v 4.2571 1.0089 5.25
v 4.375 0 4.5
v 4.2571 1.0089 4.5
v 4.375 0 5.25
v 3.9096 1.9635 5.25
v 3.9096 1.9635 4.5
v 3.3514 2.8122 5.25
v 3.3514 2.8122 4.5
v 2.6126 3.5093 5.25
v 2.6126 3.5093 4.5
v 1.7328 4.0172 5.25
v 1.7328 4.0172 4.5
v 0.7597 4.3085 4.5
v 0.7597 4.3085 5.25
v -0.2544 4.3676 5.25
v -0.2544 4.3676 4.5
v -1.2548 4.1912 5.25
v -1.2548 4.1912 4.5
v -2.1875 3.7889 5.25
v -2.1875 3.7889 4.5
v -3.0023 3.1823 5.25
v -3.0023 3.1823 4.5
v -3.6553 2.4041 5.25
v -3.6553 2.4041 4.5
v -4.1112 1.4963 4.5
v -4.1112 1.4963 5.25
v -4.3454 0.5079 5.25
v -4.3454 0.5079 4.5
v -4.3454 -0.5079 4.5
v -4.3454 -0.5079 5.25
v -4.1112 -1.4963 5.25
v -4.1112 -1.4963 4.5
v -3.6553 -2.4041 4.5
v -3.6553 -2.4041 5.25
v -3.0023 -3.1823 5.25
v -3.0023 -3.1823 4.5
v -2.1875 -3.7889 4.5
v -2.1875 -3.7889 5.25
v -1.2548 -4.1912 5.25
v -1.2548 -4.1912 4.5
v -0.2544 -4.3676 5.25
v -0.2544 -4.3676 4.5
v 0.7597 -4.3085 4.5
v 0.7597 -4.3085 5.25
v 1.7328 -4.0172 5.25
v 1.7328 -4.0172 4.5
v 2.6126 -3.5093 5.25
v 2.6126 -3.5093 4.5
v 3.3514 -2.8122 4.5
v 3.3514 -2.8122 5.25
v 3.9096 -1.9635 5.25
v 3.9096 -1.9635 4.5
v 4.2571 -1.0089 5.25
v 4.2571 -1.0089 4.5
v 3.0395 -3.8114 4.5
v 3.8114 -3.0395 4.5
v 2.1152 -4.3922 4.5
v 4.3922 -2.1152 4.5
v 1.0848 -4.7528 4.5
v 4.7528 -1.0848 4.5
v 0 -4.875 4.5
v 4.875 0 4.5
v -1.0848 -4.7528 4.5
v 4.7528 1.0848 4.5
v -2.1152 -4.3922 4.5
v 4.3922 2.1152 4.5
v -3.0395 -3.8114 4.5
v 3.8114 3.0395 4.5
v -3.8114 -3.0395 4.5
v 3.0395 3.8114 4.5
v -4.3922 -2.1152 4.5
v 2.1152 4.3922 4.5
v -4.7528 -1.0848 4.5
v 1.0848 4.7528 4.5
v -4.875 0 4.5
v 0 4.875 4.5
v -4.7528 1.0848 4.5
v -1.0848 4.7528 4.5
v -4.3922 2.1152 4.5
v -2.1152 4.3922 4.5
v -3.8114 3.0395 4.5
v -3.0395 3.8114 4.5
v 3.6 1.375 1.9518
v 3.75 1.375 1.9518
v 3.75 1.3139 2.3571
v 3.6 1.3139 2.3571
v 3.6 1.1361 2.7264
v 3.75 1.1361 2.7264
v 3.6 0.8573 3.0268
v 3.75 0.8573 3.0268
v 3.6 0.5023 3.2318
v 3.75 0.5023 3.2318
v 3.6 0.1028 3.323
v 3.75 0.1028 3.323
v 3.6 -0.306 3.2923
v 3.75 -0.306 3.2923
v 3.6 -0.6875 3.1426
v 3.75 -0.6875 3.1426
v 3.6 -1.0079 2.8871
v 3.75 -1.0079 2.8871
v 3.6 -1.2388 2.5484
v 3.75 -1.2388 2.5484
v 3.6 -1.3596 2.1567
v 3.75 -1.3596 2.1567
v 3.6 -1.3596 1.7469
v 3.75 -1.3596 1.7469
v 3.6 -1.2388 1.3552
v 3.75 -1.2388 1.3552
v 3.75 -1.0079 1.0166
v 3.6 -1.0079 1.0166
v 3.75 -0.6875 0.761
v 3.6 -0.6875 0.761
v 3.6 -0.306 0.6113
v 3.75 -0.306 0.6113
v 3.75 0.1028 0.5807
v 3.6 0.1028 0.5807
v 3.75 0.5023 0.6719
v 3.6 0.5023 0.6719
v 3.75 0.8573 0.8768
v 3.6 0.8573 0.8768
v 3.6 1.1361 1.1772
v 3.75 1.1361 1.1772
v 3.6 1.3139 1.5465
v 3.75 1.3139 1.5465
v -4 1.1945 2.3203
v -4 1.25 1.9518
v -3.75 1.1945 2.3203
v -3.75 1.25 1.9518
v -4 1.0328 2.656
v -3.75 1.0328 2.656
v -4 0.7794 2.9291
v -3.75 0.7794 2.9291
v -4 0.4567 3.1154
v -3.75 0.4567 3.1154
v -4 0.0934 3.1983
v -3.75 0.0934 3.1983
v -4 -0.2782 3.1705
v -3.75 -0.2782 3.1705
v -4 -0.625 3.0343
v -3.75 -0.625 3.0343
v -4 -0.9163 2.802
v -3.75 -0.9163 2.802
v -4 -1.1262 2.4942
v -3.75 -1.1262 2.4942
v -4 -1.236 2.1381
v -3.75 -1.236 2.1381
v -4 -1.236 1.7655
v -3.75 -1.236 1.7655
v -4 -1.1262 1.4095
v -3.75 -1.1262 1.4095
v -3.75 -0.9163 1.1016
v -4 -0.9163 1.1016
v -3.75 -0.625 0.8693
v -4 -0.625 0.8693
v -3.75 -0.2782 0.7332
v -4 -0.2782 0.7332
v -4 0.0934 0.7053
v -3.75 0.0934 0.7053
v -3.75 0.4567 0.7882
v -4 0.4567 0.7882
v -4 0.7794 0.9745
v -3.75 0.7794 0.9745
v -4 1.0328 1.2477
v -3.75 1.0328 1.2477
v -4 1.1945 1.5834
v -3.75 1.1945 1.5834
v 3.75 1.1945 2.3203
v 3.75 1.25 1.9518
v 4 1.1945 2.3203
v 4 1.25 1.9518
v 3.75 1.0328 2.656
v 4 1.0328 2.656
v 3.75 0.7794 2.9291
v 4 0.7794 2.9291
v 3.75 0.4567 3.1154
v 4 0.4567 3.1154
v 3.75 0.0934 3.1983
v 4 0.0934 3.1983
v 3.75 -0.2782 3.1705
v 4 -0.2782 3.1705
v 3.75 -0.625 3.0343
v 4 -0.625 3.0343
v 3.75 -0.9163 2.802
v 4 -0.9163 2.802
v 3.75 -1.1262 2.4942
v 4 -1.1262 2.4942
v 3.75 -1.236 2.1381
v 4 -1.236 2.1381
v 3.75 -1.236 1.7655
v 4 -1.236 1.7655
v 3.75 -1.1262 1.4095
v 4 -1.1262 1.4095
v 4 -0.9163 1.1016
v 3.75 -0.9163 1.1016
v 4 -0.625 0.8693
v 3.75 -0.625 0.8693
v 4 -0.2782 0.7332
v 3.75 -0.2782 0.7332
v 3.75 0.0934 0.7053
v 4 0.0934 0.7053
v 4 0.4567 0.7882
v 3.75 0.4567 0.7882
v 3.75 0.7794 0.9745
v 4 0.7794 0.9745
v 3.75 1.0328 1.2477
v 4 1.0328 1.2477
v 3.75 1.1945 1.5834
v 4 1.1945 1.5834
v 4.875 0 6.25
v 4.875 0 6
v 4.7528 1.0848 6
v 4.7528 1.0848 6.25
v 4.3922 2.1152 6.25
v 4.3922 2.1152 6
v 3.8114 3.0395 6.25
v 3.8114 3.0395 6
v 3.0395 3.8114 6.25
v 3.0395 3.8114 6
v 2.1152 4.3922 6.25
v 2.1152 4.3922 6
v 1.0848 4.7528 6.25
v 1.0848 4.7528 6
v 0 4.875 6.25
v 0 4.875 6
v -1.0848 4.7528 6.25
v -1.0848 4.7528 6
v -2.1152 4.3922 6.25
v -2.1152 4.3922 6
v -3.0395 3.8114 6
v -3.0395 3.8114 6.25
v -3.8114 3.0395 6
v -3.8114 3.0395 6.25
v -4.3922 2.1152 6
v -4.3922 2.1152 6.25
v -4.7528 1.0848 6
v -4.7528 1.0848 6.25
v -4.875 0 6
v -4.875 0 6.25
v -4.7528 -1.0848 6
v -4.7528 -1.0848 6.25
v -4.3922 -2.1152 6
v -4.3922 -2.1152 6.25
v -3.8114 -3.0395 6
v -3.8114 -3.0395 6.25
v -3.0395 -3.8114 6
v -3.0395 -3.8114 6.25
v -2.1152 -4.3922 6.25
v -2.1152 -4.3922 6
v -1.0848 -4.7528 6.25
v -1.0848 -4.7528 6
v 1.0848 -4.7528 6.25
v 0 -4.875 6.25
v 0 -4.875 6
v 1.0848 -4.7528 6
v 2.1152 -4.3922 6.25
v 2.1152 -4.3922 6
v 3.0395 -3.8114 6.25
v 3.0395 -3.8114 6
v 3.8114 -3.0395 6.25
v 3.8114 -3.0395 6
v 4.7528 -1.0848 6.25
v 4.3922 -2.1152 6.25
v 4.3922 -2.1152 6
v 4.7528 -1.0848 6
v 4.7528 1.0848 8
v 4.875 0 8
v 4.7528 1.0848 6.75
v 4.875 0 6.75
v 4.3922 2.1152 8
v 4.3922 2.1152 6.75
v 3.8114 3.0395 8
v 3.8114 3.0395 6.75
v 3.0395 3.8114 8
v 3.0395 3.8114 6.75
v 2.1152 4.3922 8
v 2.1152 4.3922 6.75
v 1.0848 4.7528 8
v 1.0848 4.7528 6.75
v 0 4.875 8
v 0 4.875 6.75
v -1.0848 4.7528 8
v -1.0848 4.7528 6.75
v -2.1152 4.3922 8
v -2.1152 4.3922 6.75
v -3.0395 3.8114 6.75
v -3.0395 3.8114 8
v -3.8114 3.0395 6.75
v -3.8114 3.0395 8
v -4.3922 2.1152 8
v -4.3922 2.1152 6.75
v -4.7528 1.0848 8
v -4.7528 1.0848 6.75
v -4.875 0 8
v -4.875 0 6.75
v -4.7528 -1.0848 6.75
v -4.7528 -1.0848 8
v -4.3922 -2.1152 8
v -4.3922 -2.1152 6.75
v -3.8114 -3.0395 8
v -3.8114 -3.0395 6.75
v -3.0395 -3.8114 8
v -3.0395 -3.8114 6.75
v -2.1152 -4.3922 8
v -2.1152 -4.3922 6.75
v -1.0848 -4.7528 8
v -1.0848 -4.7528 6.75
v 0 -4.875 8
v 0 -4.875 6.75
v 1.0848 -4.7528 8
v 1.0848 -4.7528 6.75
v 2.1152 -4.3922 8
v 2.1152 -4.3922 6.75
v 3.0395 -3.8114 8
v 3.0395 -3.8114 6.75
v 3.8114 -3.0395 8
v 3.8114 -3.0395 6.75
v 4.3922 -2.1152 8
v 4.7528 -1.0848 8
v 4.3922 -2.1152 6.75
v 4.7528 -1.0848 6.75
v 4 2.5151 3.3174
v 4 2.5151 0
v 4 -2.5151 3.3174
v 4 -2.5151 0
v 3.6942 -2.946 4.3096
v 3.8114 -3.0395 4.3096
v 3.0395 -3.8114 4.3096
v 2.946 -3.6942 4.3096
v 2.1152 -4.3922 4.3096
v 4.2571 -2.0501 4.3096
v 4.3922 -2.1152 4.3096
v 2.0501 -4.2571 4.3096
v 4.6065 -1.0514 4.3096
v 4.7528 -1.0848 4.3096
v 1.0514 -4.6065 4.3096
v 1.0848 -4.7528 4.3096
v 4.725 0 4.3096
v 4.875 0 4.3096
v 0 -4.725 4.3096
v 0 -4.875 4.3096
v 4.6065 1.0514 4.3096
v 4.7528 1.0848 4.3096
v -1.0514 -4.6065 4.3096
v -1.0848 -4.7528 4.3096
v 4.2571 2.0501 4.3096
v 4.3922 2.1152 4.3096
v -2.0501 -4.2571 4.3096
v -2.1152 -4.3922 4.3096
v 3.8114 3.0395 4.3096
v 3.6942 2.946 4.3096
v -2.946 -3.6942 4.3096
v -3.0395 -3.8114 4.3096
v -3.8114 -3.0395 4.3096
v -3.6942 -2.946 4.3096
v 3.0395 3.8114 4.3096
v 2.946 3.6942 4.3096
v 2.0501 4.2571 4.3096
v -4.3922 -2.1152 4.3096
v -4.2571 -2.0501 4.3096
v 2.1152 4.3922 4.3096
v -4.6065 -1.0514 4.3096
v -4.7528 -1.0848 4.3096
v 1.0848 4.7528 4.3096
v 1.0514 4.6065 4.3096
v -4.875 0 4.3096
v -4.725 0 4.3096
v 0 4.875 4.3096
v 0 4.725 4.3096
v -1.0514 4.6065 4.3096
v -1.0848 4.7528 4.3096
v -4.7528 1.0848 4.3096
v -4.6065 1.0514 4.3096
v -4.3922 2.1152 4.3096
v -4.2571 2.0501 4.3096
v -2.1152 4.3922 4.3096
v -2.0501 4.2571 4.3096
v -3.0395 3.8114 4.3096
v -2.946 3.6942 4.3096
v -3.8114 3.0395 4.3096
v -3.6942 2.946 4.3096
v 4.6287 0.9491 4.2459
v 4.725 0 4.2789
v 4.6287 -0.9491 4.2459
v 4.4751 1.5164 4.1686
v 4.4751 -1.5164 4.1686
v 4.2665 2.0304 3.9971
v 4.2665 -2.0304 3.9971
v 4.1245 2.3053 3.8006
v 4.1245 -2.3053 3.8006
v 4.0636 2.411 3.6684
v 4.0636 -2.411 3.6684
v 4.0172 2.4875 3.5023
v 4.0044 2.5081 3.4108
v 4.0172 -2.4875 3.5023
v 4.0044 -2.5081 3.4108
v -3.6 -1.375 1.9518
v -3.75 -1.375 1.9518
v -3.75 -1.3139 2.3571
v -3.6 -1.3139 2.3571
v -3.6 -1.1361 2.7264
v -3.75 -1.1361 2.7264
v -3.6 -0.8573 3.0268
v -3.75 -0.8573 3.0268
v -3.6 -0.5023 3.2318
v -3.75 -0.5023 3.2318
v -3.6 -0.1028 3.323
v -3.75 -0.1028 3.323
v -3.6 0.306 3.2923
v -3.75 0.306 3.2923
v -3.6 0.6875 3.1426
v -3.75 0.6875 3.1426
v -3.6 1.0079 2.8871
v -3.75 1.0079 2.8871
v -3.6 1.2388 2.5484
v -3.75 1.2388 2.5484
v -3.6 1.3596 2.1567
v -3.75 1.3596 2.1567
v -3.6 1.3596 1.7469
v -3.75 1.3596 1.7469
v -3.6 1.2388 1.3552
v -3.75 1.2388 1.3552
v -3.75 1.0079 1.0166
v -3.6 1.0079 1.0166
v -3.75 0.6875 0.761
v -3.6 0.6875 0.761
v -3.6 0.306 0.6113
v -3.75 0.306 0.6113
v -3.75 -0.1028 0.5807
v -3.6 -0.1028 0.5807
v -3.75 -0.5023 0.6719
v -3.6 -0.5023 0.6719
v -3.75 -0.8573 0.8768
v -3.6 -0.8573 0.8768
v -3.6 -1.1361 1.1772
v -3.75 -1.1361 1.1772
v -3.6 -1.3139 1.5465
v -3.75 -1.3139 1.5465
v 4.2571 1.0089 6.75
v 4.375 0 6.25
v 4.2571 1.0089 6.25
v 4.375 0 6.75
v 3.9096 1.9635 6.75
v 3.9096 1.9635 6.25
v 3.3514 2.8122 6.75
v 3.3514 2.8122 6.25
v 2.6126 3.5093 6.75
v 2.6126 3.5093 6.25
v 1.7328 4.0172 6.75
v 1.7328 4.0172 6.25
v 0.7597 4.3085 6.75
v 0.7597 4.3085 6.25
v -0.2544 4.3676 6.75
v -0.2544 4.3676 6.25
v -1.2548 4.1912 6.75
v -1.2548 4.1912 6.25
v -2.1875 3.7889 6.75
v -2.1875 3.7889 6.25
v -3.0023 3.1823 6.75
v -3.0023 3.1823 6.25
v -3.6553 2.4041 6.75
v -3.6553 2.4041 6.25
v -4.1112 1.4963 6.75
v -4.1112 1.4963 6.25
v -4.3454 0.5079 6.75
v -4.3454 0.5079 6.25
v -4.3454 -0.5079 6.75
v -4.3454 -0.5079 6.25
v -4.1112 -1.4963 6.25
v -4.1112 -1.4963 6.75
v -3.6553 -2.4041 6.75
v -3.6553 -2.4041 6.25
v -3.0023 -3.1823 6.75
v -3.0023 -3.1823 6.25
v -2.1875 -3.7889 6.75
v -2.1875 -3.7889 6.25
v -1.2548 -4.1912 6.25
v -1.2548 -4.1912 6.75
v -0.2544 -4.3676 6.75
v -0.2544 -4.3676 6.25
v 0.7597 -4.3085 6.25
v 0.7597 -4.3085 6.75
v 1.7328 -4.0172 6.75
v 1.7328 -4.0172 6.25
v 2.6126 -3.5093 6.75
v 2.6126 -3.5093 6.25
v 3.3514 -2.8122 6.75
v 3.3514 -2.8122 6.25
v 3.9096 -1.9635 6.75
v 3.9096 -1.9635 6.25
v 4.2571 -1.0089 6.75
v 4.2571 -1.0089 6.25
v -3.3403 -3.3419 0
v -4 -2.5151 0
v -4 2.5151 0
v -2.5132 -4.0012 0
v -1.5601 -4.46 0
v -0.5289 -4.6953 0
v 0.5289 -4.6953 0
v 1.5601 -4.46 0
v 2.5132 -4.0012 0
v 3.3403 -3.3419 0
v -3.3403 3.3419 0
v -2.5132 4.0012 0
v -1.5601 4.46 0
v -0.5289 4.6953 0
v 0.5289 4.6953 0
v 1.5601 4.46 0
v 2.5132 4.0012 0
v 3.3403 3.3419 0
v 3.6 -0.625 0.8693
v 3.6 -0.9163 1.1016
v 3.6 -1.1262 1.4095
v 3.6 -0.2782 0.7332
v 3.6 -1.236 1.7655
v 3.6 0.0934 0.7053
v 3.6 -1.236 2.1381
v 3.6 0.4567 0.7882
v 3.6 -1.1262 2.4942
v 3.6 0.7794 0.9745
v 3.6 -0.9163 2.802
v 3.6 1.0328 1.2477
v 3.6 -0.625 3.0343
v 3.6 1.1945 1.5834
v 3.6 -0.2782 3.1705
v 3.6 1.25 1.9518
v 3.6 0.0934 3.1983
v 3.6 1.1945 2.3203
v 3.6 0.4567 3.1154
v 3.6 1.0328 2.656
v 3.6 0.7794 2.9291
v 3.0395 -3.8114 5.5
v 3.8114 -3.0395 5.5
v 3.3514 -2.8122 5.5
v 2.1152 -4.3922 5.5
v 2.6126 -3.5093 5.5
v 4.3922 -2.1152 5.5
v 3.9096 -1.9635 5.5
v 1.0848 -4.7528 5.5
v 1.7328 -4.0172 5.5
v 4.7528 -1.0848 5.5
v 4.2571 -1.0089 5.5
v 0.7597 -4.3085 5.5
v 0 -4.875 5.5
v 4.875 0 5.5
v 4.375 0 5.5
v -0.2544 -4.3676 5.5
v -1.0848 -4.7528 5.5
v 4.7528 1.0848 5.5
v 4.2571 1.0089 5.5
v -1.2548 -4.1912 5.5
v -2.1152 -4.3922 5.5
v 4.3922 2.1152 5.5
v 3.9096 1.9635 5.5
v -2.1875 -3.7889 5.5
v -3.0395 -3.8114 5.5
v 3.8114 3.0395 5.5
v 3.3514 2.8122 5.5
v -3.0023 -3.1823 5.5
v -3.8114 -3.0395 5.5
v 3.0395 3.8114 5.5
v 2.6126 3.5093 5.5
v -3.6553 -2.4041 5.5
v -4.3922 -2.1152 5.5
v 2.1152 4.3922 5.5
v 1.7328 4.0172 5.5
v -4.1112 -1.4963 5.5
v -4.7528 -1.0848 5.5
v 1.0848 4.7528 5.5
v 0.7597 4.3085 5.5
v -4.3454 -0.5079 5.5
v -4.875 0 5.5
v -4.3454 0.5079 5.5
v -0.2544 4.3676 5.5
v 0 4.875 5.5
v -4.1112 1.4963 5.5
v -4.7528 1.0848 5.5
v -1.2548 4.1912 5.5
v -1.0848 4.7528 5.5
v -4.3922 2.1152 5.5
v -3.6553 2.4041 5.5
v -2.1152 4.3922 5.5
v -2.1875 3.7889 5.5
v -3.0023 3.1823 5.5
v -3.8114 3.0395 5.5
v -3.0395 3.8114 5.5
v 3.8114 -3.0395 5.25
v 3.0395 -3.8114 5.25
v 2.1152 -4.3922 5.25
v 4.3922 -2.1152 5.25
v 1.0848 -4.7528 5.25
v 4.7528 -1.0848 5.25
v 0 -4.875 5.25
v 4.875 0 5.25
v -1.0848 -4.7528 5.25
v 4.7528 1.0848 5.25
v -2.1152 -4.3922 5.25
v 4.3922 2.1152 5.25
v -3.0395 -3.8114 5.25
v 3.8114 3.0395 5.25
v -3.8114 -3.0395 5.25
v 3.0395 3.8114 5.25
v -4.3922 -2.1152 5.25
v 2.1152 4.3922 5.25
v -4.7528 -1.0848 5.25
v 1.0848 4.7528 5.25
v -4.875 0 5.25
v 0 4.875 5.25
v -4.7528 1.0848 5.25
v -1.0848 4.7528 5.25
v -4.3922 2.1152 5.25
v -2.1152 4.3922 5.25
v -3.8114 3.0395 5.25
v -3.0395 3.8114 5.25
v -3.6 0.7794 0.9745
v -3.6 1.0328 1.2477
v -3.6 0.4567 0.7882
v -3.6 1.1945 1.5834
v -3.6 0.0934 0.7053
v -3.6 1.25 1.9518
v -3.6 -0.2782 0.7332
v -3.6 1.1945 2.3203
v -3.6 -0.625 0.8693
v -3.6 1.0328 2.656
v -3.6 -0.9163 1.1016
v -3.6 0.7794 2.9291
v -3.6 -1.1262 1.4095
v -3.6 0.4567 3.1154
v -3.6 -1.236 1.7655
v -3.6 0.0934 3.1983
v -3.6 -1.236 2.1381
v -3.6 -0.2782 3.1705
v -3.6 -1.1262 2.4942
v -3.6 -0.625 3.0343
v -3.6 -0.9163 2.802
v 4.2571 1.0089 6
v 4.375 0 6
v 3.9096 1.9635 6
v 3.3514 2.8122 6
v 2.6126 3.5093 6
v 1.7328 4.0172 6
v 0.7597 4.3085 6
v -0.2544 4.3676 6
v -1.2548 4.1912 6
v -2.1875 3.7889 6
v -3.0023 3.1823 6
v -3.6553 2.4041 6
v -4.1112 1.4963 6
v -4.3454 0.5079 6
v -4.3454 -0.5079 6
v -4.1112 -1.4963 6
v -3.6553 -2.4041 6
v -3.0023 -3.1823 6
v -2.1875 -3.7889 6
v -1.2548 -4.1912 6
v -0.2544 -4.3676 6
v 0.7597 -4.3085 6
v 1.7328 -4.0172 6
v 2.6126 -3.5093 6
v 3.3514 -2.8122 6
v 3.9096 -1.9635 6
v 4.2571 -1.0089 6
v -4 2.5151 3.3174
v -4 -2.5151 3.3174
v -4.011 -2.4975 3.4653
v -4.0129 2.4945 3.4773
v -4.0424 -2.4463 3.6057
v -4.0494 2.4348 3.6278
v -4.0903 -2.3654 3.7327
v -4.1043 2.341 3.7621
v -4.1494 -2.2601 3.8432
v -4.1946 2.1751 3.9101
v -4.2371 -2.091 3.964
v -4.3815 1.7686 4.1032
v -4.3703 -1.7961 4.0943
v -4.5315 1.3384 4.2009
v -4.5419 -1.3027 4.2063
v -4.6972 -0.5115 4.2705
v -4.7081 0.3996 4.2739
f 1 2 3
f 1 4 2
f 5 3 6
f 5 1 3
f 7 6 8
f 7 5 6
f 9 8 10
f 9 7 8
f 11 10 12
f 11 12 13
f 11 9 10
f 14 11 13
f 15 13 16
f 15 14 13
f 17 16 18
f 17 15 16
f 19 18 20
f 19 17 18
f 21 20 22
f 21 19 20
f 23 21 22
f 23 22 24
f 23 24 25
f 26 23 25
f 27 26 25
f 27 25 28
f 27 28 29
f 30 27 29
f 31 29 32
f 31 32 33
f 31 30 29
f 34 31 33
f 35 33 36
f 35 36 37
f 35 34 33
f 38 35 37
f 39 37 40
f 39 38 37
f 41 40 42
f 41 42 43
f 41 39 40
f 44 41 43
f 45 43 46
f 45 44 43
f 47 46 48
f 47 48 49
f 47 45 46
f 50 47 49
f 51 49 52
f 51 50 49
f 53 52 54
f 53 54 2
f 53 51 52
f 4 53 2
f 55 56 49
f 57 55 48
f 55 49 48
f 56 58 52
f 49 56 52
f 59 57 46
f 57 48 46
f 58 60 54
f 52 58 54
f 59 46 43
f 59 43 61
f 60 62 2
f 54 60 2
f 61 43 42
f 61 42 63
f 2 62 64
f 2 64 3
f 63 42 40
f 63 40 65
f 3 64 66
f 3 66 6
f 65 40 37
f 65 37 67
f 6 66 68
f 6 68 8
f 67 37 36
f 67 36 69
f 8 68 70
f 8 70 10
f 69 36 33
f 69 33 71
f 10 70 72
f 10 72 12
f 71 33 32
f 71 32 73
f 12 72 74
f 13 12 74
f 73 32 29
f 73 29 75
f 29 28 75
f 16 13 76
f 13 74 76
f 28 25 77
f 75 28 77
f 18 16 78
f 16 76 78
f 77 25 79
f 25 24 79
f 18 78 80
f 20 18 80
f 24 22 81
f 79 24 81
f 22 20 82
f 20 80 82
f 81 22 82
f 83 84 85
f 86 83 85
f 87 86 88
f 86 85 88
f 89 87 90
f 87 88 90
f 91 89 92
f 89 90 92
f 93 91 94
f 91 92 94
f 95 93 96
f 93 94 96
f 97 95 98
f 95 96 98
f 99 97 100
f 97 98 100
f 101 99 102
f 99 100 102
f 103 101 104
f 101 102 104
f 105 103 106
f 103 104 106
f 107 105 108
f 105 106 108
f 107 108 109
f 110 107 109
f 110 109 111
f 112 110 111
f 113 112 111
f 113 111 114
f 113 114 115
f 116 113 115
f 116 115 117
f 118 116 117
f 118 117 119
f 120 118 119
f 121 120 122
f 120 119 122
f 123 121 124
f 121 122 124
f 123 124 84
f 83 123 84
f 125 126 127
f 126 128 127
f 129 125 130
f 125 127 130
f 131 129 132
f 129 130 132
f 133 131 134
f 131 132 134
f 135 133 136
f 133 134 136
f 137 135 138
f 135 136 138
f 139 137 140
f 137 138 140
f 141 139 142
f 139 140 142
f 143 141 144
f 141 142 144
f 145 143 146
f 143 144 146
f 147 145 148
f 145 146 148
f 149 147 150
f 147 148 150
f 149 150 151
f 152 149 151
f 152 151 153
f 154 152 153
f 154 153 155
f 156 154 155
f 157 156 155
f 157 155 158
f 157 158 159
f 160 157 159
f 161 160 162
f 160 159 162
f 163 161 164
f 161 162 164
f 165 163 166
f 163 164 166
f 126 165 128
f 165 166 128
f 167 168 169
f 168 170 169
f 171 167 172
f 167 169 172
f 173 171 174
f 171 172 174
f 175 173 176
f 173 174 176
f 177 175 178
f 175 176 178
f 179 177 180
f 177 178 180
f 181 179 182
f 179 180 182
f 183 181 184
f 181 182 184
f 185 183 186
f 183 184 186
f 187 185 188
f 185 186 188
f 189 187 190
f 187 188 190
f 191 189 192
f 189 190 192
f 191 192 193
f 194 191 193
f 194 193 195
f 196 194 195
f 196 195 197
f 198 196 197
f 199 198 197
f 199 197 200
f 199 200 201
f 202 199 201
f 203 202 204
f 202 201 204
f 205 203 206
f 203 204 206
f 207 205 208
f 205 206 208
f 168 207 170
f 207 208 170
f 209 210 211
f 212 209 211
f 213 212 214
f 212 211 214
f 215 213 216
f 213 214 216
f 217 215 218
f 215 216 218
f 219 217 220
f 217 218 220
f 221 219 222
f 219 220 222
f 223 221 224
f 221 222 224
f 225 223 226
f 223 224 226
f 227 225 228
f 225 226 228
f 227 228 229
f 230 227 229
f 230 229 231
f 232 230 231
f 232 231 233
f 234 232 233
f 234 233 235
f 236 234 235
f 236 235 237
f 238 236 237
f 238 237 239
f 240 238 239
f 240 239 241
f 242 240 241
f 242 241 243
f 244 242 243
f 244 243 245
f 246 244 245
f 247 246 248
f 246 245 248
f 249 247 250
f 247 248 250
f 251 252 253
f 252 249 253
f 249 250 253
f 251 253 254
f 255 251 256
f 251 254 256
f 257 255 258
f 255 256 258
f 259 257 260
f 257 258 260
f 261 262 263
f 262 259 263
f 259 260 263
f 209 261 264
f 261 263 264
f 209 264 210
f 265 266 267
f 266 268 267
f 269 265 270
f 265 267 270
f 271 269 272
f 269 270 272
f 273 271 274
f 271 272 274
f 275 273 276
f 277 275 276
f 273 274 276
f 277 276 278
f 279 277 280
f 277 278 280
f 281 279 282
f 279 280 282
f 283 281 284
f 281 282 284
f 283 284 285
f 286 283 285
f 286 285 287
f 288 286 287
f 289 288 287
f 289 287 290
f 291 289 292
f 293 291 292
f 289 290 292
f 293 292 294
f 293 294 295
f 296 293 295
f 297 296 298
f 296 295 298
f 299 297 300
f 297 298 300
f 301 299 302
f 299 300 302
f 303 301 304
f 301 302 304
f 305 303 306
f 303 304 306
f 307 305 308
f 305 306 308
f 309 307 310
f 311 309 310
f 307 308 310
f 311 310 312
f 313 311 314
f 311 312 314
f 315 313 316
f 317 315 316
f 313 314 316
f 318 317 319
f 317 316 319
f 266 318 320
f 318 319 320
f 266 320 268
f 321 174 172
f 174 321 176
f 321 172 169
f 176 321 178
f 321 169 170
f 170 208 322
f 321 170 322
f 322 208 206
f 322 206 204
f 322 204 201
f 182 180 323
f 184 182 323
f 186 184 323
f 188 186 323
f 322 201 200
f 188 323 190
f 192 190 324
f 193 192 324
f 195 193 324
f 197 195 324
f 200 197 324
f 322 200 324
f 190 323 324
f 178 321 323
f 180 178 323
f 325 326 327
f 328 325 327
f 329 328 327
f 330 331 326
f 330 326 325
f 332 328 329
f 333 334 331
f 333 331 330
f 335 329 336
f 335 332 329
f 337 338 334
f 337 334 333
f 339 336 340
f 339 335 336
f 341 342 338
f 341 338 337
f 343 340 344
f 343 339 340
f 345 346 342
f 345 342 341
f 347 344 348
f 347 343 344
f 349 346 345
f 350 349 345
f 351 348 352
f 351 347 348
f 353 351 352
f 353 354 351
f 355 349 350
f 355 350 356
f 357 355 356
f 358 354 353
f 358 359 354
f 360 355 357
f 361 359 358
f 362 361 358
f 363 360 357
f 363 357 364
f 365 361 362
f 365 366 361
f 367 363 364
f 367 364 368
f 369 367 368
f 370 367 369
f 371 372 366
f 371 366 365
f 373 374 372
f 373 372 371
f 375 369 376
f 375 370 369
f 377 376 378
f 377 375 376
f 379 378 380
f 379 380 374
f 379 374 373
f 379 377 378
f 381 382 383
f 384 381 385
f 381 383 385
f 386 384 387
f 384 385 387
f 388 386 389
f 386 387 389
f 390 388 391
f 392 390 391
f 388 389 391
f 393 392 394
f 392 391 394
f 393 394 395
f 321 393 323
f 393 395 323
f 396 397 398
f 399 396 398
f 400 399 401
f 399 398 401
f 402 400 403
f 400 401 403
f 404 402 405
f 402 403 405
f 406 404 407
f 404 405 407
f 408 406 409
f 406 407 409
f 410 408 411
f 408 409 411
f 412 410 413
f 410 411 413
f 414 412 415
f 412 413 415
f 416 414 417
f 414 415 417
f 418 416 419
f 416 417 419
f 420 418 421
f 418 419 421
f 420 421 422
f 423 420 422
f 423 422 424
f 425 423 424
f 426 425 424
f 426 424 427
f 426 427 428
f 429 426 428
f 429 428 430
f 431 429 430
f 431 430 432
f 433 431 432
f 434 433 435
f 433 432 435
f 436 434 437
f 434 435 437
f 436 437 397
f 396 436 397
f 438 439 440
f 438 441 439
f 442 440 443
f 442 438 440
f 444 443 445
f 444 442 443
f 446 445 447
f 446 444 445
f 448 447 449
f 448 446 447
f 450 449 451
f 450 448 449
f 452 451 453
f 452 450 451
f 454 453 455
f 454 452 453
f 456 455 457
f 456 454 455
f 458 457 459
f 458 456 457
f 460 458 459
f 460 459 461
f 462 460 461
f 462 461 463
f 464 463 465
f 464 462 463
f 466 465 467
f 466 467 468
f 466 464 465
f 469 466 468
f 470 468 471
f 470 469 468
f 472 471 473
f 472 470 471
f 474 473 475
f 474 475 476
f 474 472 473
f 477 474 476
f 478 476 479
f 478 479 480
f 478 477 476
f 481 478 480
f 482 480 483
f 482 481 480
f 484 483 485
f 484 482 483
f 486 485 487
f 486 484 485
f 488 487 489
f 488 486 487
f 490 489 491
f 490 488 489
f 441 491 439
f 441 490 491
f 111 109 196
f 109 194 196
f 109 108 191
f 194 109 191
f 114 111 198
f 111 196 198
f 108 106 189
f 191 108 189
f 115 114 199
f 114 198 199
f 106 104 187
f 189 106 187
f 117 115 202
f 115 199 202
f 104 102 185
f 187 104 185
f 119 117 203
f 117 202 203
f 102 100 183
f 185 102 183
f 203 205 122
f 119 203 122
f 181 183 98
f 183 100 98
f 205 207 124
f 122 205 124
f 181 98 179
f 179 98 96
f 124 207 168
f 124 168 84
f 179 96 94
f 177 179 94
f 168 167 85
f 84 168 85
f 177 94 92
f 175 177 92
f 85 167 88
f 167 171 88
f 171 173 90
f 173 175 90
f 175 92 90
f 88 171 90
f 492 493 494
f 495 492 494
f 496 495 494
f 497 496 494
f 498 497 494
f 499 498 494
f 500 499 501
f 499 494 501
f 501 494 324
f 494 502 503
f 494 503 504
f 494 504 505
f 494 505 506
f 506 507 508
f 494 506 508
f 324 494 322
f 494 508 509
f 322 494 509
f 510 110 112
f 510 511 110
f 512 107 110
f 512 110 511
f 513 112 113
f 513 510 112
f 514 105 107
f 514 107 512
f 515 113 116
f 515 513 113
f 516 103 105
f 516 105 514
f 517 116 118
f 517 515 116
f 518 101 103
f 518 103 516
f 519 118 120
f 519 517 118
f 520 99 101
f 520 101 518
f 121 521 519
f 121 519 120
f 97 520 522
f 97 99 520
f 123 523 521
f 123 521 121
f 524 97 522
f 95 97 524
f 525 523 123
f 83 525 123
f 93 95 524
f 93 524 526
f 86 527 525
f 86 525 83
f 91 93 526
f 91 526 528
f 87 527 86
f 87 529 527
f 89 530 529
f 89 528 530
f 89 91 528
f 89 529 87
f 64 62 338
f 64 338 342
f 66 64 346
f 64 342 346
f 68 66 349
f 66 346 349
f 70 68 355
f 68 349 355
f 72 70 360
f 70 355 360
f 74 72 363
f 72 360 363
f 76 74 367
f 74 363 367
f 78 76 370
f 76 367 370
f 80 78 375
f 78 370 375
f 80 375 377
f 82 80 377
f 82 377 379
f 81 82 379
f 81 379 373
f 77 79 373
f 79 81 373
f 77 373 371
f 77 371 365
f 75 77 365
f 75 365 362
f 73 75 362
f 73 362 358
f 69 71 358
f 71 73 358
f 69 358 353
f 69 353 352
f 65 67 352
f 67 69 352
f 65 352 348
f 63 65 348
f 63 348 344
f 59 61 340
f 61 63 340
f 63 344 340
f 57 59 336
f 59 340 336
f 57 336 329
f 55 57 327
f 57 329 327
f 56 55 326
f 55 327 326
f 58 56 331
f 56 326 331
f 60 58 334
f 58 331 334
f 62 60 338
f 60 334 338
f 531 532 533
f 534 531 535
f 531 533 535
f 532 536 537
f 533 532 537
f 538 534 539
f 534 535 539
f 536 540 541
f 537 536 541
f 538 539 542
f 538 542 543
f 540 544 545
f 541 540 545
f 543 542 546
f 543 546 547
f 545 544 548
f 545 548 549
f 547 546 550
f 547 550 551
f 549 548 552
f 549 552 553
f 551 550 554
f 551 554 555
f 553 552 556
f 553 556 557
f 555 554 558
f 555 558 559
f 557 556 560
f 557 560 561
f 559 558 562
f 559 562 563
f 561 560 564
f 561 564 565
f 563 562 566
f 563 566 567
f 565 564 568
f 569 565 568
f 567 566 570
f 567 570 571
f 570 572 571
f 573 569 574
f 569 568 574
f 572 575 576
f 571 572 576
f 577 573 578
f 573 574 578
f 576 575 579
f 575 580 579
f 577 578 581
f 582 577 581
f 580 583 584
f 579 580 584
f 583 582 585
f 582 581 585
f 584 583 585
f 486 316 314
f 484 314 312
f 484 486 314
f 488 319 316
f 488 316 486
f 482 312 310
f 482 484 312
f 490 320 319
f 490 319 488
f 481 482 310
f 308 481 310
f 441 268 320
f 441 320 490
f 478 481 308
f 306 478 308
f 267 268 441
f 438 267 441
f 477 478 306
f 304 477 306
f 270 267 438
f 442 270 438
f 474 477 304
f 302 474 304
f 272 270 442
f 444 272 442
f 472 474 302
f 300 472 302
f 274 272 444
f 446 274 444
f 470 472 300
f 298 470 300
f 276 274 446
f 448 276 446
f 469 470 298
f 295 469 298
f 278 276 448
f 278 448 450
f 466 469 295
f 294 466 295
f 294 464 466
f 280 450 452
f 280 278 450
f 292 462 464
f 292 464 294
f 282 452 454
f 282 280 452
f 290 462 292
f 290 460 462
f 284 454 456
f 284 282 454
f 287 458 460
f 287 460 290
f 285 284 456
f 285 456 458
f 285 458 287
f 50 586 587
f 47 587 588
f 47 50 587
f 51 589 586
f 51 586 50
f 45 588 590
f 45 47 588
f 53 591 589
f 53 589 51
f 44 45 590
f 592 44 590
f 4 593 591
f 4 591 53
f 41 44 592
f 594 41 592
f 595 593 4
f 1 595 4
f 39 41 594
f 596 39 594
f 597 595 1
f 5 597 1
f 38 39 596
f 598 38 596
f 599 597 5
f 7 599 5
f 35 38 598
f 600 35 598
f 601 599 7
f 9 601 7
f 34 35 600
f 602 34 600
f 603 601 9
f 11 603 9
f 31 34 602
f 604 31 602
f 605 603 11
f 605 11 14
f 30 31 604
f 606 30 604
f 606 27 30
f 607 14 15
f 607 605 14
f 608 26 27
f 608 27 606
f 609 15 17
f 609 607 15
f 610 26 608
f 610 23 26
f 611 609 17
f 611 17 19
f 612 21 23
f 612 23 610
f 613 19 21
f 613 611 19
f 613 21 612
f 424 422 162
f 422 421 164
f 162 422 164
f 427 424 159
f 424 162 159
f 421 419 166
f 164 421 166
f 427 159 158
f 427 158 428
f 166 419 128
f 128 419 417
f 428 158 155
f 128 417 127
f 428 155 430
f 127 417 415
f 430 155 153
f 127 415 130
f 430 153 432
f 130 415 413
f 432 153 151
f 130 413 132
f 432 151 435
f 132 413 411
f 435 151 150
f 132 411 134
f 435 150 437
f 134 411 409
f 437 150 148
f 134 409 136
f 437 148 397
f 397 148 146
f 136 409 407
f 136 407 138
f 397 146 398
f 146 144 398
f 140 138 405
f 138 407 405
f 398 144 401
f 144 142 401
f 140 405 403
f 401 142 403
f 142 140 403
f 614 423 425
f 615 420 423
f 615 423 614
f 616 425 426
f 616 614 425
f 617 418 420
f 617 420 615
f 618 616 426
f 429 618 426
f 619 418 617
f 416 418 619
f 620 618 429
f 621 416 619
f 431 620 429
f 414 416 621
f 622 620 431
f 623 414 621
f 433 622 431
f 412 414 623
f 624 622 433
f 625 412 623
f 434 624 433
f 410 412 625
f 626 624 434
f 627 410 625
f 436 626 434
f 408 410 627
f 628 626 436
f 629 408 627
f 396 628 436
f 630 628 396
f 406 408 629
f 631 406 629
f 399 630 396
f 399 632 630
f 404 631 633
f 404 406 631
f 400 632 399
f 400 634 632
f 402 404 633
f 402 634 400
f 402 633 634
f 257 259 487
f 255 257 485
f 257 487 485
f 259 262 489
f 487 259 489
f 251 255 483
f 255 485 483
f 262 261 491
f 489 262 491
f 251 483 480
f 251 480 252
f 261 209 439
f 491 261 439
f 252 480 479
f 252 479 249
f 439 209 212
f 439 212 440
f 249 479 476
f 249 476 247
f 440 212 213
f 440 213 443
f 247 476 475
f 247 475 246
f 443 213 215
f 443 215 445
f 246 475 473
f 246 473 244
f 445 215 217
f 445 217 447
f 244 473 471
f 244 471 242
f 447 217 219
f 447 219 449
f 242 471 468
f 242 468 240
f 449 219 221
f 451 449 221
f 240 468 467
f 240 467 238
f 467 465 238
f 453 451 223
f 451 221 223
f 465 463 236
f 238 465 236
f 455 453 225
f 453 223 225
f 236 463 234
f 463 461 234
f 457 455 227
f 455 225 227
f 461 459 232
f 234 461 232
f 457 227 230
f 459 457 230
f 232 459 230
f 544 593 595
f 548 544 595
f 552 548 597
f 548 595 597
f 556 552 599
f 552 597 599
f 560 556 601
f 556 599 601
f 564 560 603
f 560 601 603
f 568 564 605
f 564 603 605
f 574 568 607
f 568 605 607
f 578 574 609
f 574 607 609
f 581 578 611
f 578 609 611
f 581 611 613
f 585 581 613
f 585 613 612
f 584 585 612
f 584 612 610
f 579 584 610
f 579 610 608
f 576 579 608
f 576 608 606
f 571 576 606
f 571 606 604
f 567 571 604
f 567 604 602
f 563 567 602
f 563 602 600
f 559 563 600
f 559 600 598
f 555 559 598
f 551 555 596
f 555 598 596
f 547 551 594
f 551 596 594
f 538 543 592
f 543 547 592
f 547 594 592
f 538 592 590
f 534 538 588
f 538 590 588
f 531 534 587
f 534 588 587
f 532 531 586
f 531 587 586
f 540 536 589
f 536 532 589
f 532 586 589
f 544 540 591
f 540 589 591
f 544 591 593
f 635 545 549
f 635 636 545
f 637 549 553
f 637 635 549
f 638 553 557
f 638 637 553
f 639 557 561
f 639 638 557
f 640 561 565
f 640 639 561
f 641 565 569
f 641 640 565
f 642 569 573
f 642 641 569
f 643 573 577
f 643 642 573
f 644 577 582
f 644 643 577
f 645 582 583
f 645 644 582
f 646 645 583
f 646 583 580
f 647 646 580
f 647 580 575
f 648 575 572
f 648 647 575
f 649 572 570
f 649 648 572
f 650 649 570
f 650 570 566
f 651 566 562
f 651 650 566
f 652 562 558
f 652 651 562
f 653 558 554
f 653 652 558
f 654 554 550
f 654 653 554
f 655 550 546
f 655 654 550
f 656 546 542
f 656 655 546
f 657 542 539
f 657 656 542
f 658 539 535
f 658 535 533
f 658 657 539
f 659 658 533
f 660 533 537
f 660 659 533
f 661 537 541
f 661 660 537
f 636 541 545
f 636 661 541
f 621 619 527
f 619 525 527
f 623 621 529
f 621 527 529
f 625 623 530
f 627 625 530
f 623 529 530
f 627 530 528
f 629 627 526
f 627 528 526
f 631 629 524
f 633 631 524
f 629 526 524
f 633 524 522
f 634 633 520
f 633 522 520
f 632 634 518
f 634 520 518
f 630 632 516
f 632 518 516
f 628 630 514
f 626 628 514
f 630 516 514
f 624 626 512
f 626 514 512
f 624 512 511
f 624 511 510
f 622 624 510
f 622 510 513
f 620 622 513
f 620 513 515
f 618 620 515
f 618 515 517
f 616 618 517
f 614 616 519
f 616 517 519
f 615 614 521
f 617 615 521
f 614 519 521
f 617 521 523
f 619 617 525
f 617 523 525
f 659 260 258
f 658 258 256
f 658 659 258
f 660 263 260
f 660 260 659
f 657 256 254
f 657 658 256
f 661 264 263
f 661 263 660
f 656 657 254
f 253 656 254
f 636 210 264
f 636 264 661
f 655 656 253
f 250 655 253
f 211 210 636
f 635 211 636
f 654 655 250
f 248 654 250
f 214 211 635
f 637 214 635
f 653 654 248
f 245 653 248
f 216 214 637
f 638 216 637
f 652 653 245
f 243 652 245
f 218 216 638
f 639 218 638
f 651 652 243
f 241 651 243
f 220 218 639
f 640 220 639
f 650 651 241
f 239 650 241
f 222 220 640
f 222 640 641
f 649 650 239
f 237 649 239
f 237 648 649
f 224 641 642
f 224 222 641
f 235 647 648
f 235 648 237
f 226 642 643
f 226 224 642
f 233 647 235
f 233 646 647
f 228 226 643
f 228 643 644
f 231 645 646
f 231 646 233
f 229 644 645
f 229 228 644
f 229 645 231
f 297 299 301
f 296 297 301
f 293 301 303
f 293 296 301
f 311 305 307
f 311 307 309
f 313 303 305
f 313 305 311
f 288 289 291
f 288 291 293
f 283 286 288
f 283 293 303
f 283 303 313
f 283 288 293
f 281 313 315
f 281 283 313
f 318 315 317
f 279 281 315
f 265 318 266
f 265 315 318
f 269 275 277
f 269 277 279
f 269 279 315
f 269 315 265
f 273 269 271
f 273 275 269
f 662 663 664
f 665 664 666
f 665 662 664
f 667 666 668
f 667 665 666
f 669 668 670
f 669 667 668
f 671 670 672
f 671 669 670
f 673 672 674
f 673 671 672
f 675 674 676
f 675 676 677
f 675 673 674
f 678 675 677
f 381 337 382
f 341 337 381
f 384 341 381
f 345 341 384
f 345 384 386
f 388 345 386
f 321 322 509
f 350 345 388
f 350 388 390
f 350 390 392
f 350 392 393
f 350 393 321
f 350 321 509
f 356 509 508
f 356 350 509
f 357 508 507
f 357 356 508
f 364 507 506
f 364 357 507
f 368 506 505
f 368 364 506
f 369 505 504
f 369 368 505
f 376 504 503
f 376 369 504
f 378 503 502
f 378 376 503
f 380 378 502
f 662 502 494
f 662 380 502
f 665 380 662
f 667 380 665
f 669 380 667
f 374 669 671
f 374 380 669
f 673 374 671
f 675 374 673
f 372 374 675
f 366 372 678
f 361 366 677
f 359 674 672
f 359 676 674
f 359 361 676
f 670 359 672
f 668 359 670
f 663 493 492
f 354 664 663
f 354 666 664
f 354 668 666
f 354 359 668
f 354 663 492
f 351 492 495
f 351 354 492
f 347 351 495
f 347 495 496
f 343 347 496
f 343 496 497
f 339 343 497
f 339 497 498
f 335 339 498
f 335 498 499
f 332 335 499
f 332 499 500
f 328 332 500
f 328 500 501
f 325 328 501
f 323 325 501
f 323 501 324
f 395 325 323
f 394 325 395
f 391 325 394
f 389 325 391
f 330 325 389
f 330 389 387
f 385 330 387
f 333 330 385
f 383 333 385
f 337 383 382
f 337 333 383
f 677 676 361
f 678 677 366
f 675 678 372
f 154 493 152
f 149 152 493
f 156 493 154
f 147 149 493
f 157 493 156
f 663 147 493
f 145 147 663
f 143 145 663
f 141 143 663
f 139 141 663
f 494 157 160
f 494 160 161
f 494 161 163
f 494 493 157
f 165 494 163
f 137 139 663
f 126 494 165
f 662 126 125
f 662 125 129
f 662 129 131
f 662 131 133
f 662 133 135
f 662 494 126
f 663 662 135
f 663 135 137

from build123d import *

# Parameters (mm, degrees)
F0_R      = 4.875
F1_DEPTH  = 7
F3_DEPTH  = 5
F4_R      = 1.25
F5_DEPTH  = 5
F6_W      = 0.9999981817
F6_H      = 0.5
F6_W_2    = 1
F6_H_2    = 0.75
F6_W_3    = 0.65
F6_H_3    = 4.3095893331
F8_DEPTH  = 1
F10_R     = 1.375
F10_R_2   = 1.25
F11_DEPTH = 0.15
F13_R     = 1.375
F13_R_2   = 1.25
F14_DEPTH = 0.15


with BuildPart() as f1:
    # F0 (on Top) → F1 (new body)
    with BuildSketch(Plane.XY):
        Circle(F0_R)
    extrude(amount=F1_DEPTH)

    # F2 (on Front) → F3 (cut, symmetric)
    with BuildSketch(Plane.XZ):
        with BuildLine():
            Line((-4, 0), (-4, 3.3174325915))
            ThreePointArc((-4, 3.3174325915), (-4.2928932188, 4.0245393727), (-5, 4.3174325915))
            Line((-5, 4.3174325915), (-5, 0))
            Line((-5, 0), (-4, 0))
        make_face()
        with BuildLine():
            ThreePointArc((5, 4.3174325915), (4.2928932188, 4.0245393727), (4, 3.3174325915))
            Line((4, 3.3174325915), (4, 0))
            Line((4, 0), (5, 0))
            Line((5, 0), (5, 4.3174325915))
        make_face()
    extrude(amount=F3_DEPTH, both=True, mode=Mode.SUBTRACT)

    # F4 (on Right) → F5 (cut, symmetric)
    with BuildSketch(Plane.YZ):
        with Locations((0, 1.9518149326)):
            Circle(F4_R)
    extrude(amount=F5_DEPTH, both=True, mode=Mode.SUBTRACT)

    # F6 (on Front) → F7 (revolve, cut)
    with BuildSketch(Plane.XZ):
        with Locations((4.875, 6.5)):
            Rectangle(F6_W, F6_H)
        with Locations((4.875, 5.75)):
            Rectangle(F6_W_2, F6_H)
        with Locations((4.875, 4.875)):
            Rectangle(F6_W_2, F6_H_2)
        with Locations((5.05, 2.1547946666)):
            Rectangle(F6_W_3, F6_H_3)
    revolve(axis=Axis((0, 0, 3.6421683617), (0, 0, 1)), mode=Mode.SUBTRACT)

    # F8 (add): a face of the model
    f8_faces = [f1.faces().sort_by_distance(p)[0] for p in [
        (0, 0, 7),
    ]]
    extrude(f8_faces, amount=F8_DEPTH)

    # F10 (on offset) → F11 (cut)
    with BuildSketch(Plane.YZ.offset(3.75)):
        with Locations((0, 1.9518149326)):
            Circle(F10_R)
        with Locations((0, 1.9518149326)):
            Circle(F10_R_2, mode=Mode.SUBTRACT)
    extrude(amount=-F11_DEPTH, mode=Mode.SUBTRACT)

    # F13 (on offset) → F14 (cut)
    with BuildSketch(Plane(origin=(-3.75, 0, 0), x_dir=(0, -1, 0), z_dir=(-1, 0, 0))):
        with Locations((0, 1.9518149326)):
            Circle(F13_R)
        with Locations((0, 1.9518149326)):
            Circle(F13_R_2, mode=Mode.SUBTRACT)
    extrude(amount=-F14_DEPTH, mode=Mode.SUBTRACT)


solid = f1.part
